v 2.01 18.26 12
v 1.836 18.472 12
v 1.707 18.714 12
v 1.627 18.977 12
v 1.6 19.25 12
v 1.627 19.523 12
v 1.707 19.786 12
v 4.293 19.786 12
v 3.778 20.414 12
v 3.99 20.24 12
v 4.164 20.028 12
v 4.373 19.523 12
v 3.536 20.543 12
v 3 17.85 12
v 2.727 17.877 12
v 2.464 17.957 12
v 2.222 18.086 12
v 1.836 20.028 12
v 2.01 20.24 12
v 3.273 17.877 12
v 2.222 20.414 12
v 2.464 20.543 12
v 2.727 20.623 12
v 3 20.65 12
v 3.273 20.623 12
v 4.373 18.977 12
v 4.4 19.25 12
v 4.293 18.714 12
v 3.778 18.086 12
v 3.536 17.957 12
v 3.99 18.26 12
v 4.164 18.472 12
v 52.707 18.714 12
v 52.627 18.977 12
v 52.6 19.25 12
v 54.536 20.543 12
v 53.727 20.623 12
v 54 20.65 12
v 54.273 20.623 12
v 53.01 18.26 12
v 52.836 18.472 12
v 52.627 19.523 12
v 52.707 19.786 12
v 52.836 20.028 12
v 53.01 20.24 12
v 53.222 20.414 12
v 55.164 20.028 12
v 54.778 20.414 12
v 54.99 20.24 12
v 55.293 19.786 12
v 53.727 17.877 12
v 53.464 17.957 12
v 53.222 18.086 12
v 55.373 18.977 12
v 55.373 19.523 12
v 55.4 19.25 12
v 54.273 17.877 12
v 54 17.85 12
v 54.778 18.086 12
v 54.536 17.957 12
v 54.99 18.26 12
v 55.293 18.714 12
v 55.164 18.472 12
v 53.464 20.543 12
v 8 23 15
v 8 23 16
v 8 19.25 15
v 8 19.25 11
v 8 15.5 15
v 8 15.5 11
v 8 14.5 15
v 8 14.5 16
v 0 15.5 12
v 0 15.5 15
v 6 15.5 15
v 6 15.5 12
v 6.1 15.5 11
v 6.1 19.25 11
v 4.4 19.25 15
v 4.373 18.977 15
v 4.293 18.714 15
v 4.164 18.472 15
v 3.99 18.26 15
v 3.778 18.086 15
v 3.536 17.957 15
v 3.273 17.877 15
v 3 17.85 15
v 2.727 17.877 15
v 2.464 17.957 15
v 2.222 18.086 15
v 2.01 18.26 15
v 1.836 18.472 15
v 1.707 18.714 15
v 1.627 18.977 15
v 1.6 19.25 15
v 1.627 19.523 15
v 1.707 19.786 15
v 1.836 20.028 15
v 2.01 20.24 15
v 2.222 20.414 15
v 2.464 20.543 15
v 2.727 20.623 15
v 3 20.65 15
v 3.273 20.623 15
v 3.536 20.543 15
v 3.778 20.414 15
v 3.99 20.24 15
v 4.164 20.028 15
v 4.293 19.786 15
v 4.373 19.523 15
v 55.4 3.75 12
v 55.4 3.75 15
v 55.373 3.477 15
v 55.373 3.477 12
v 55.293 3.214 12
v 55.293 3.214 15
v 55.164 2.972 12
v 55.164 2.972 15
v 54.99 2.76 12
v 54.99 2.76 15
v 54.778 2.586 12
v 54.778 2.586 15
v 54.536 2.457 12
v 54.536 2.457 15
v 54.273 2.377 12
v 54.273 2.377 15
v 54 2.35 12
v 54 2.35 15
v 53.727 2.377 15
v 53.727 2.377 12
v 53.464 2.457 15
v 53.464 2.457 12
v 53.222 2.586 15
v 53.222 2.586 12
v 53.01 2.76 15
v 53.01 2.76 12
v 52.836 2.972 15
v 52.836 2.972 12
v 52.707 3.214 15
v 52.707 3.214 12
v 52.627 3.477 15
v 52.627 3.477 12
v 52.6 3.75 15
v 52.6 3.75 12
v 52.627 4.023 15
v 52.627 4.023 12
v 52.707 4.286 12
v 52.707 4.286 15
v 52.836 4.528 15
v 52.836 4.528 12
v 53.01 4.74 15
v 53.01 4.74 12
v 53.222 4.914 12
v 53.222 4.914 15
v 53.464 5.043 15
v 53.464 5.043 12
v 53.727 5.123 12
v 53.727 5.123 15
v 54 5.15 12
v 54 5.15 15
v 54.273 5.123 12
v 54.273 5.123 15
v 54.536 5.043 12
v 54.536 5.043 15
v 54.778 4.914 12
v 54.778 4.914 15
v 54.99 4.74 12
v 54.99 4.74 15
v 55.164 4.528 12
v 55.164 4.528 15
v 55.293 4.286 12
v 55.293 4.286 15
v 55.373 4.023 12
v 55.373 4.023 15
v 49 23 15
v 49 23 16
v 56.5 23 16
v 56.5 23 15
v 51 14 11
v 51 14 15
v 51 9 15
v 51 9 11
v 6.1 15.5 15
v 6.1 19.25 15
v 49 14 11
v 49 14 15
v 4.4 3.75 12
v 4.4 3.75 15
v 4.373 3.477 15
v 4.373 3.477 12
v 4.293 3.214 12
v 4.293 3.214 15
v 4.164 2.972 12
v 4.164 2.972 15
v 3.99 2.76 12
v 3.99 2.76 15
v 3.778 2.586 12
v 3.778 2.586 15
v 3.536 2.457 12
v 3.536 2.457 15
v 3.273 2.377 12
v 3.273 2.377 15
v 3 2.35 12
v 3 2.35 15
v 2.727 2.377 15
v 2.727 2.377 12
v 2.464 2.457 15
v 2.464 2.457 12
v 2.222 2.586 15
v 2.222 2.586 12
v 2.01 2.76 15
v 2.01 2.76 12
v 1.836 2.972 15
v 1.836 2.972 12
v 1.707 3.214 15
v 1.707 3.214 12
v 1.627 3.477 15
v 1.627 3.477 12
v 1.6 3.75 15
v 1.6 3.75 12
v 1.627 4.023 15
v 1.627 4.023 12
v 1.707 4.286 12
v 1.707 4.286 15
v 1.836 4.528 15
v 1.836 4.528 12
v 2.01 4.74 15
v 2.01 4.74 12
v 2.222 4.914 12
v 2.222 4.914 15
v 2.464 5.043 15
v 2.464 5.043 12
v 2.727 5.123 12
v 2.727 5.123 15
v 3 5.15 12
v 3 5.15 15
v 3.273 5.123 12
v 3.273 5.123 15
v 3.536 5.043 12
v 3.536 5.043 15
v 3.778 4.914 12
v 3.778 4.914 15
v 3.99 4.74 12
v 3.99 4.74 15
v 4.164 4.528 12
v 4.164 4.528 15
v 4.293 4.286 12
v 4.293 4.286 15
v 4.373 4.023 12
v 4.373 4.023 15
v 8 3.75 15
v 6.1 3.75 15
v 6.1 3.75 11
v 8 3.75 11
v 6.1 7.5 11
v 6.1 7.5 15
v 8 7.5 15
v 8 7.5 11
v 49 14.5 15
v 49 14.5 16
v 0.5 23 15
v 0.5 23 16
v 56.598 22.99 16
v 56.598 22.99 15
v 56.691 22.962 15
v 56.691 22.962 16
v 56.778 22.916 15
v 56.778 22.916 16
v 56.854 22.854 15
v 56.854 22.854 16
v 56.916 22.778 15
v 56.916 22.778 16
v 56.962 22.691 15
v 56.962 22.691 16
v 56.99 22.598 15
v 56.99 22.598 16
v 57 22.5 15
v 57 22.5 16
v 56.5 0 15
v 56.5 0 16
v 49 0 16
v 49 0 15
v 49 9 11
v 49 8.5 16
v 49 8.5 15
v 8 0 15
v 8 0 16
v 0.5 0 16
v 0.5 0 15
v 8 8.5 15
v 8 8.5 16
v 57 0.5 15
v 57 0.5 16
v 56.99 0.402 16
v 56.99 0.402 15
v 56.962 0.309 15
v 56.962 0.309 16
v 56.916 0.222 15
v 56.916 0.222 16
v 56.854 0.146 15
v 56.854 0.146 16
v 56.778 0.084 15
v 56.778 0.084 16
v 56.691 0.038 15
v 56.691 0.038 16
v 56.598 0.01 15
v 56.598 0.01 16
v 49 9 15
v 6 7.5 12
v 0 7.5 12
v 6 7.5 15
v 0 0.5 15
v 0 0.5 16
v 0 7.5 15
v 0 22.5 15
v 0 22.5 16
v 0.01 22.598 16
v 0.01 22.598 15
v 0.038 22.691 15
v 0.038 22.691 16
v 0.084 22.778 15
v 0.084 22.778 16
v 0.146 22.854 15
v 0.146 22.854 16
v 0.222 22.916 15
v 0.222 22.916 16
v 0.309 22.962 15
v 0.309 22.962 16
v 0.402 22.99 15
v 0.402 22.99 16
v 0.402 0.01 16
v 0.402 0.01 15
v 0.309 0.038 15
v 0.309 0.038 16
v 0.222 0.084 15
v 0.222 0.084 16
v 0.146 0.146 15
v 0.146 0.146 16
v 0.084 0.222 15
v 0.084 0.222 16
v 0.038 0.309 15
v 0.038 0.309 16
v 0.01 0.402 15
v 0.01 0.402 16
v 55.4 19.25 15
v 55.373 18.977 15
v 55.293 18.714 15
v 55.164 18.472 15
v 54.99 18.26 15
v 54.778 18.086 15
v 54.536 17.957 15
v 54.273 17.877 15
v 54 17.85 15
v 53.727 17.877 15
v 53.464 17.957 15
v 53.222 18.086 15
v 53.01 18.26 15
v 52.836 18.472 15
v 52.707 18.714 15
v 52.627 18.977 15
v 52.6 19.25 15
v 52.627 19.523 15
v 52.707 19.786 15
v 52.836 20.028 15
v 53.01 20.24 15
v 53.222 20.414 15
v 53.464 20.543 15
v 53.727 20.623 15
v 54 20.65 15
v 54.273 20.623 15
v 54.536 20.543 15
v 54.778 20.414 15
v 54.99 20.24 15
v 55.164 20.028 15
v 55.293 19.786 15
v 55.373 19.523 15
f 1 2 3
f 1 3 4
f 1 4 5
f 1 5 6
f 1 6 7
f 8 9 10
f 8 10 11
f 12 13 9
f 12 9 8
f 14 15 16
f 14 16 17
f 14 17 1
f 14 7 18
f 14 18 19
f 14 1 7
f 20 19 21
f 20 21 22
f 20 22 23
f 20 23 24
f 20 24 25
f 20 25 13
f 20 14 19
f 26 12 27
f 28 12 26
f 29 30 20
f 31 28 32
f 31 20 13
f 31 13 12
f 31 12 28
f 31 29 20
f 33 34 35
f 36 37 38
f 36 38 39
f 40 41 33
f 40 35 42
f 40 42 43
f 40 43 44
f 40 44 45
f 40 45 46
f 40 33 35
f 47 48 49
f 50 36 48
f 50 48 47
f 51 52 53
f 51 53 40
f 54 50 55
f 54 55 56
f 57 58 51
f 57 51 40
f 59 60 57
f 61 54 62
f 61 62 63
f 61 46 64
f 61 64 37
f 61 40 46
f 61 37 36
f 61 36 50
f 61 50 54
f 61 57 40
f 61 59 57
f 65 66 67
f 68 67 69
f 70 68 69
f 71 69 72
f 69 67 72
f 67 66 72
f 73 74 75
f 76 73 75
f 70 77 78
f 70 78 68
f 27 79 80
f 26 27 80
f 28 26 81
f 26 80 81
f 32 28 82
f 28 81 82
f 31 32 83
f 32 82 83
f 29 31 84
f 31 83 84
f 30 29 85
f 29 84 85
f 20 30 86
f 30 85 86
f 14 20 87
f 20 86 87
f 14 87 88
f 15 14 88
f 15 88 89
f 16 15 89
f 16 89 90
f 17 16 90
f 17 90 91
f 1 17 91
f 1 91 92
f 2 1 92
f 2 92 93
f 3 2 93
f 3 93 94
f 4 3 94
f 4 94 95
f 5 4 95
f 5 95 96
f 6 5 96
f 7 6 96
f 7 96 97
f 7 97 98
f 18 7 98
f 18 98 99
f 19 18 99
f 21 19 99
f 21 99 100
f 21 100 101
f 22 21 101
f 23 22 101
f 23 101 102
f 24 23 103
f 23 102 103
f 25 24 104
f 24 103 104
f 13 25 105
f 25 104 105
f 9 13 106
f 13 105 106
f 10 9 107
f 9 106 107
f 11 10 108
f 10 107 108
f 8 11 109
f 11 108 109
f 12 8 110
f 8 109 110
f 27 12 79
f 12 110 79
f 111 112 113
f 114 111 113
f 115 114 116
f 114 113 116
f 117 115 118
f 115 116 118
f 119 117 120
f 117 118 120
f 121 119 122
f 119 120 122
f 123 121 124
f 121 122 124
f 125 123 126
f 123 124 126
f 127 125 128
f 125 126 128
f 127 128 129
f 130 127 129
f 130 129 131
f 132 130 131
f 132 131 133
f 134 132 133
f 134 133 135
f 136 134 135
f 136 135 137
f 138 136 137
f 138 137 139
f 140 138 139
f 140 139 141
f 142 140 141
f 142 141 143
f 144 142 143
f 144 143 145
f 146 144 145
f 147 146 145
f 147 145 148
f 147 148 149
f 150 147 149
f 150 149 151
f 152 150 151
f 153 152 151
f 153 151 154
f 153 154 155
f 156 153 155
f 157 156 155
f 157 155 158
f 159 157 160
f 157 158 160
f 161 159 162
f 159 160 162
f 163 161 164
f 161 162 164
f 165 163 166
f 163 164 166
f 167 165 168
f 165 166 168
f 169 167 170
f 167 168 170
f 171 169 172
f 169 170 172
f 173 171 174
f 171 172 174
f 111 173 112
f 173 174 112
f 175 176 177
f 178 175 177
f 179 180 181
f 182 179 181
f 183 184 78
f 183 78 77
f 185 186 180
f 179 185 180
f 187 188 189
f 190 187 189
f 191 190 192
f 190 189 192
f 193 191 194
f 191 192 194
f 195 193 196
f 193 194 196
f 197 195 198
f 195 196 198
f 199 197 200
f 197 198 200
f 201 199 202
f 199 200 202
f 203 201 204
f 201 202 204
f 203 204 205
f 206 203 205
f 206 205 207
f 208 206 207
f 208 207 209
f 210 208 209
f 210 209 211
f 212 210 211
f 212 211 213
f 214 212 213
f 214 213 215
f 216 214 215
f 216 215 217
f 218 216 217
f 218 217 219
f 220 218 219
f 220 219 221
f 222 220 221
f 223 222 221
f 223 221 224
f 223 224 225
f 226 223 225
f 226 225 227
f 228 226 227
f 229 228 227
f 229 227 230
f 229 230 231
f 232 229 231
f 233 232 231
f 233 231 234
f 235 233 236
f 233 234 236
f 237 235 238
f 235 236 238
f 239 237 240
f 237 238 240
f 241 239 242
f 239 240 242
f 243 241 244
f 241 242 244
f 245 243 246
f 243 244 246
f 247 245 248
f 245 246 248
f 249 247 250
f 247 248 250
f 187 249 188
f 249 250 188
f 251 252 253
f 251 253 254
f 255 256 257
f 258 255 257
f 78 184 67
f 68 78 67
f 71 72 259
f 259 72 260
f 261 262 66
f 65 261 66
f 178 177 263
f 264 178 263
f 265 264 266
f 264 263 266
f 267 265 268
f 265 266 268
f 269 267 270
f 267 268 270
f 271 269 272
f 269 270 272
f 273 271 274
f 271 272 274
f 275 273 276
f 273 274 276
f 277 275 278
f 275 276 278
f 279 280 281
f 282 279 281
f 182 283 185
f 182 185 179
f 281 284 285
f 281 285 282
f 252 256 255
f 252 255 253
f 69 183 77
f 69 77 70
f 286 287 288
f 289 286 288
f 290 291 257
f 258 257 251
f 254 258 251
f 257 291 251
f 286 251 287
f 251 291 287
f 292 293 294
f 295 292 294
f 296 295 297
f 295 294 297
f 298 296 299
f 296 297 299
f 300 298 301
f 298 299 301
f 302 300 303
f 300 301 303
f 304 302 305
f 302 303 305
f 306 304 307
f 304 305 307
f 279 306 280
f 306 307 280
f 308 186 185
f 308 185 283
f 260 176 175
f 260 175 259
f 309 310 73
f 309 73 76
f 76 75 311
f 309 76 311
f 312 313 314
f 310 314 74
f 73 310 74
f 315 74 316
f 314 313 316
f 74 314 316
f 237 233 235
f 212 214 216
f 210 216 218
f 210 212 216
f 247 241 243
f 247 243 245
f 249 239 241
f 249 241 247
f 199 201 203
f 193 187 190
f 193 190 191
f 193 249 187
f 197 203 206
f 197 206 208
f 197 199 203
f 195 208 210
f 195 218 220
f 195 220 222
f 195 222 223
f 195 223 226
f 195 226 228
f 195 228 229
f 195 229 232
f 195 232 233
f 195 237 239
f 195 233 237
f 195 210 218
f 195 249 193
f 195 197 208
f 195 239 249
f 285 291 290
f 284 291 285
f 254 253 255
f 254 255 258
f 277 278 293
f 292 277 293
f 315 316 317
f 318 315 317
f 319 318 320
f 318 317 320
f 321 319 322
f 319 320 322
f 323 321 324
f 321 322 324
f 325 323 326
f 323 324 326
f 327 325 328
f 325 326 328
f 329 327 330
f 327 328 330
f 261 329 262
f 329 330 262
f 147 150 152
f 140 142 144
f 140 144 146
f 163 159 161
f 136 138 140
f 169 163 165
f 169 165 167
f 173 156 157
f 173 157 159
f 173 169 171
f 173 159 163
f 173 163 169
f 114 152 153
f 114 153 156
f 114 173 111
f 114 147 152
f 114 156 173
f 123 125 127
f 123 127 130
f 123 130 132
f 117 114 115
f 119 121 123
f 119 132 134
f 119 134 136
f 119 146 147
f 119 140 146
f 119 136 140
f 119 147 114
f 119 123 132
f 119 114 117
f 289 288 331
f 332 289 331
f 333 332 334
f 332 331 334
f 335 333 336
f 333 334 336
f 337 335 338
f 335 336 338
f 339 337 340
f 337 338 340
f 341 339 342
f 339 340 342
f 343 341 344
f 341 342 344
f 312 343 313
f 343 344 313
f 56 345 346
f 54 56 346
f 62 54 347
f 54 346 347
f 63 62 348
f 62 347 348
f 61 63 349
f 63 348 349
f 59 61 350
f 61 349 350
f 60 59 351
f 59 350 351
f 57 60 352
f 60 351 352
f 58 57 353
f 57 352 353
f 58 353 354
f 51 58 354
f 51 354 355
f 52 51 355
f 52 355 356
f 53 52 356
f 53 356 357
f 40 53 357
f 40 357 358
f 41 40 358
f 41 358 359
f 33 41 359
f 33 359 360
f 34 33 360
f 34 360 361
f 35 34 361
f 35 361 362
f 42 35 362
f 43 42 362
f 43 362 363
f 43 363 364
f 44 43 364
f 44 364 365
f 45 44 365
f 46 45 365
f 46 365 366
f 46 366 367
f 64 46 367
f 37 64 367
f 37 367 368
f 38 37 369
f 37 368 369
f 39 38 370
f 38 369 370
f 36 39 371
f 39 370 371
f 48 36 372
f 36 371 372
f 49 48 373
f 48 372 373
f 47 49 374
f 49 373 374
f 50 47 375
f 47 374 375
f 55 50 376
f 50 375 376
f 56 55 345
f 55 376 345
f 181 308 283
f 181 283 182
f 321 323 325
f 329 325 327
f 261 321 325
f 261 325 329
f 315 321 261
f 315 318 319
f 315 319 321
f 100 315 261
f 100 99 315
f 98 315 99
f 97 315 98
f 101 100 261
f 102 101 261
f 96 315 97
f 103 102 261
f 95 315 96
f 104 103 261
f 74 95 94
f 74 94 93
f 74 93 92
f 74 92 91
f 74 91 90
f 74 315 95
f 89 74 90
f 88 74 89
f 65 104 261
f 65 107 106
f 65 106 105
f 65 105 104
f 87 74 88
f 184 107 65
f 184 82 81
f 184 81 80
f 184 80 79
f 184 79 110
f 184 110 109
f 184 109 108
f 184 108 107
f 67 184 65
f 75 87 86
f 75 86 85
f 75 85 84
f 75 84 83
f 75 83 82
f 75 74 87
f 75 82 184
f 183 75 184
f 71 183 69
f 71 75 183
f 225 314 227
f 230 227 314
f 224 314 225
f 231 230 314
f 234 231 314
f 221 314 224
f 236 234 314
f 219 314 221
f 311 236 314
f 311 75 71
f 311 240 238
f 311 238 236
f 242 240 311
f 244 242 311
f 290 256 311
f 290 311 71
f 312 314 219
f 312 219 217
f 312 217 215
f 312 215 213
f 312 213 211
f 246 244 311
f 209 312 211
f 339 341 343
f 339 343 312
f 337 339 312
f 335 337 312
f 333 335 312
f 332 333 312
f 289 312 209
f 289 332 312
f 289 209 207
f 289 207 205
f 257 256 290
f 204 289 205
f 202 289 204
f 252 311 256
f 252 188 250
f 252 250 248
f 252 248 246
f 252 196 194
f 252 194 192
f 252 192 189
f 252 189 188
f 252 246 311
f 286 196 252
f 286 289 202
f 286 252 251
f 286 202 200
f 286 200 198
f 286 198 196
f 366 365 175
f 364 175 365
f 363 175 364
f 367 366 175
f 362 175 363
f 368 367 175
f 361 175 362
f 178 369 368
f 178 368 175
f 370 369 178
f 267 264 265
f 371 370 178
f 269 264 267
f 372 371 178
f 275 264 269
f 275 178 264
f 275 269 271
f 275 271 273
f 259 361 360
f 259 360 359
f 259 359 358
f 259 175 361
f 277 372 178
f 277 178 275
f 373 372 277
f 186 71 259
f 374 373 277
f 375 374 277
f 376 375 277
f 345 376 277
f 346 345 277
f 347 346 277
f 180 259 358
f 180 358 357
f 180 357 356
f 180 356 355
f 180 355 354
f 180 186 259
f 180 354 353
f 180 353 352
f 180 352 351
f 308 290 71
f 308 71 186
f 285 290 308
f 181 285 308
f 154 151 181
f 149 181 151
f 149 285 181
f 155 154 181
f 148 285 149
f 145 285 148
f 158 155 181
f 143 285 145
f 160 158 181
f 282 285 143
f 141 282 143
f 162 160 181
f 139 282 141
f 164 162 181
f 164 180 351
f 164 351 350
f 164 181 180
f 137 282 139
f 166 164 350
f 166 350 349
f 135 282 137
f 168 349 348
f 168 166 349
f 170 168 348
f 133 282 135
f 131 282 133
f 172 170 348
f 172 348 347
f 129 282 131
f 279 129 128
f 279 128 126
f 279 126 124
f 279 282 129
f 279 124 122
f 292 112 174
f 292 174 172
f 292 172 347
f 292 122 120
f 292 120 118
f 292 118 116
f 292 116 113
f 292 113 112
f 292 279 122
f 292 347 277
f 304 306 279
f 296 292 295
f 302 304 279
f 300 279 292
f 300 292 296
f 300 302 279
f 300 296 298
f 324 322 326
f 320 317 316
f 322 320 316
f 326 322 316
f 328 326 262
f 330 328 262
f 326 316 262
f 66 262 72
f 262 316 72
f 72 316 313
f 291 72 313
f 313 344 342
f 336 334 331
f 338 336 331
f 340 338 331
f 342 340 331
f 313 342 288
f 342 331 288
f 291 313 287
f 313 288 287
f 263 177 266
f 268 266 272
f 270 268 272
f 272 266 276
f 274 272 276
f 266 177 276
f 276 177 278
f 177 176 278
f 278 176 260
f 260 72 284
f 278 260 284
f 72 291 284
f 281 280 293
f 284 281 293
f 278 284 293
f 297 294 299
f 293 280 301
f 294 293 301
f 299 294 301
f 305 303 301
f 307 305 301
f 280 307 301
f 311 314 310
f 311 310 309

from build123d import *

# Parameters (mm, degrees)
PAD002_DEPTH            = 1
SKETCH007_R             = 1.4
SKETCH007_W             = 6
SKETCH007_H             = 8
PAD003_DEPTH            = 4
SKETCH013_W             = 2
SKETCH013_H             = 3.75
SKETCH013_H_2           = 5
PAD004_DEPTH            = 5
SKETCH014_W             = 41
SKETCH014_H             = 11.648772
SKETCH014_H_2           = 8.5
POCKET004_DEPTH         = 5.001
BODY001_PLACEMENT_ANGLE = 180


with BuildPart() as part:
    # Sketch006 → Pad002 (new body)
    with BuildSketch(Plane.XY):
        with BuildLine():
            Line((0.5, 0), (56.5, 0))
            ThreePointArc((56.5, 0), (56.853553, 0.146447), (57, 0.5))
            Line((57, 0.5), (57, 22.5))
            ThreePointArc((57, 22.5), (56.853553, 22.853553), (56.5, 23))
            Line((56.5, 23), (0.5, 23))
            ThreePointArc((0.5, 23), (0.146447, 22.853553), (0, 22.5))
            Line((0, 22.5), (0, 0.5))
            ThreePointArc((0, 0.5), (0.146447, 0.146447), (0.5, 0))
        make_face()
    extrude(amount=PAD002_DEPTH)

    # Sketch007 → Pad003 (join)
    with BuildSketch(Plane.XY):
        with Locations((3, 19.25)):
            Circle(SKETCH007_R)
        with Locations((3, 3.75)):
            Circle(SKETCH007_R)
        with Locations((54, 19.25)):
            Circle(SKETCH007_R)
        with Locations((54, 3.75)):
            Circle(SKETCH007_R)
        with Locations((3, 11.5)):
            Rectangle(SKETCH007_W, SKETCH007_H)
    extrude(amount=PAD003_DEPTH)

    # Sketch013 → Pad004 (join)
    with BuildSketch(Plane.XY):
        with Locations((7.1, 17.375)):
            Rectangle(SKETCH013_W, SKETCH013_H)
        with Locations((7.1, 5.625)):
            Rectangle(SKETCH013_W, SKETCH013_H)
        with Locations((50, 11.5)):
            Rectangle(SKETCH013_W, SKETCH013_H_2)
    extrude(amount=PAD004_DEPTH)

    # Sketch014 → Pocket004 (cut, through all)
    with BuildSketch(Plane.XY):
        with Locations((28.5, 20.324386)):
            Rectangle(SKETCH014_W, SKETCH014_H)
        with Locations((28.5, 4.25)):
            Rectangle(SKETCH014_W, SKETCH014_H_2)
    extrude(amount=POCKET004_DEPTH, mode=Mode.SUBTRACT)


with BuildPart() as part_1:
    # Body001 placement: moved
    add(part.part.moved(Location((0, 23, 16))).rotate(Axis((0, 23, 16), (-1, 0, 0)), BODY001_PLACEMENT_ANGLE))


solid = part_1.part
